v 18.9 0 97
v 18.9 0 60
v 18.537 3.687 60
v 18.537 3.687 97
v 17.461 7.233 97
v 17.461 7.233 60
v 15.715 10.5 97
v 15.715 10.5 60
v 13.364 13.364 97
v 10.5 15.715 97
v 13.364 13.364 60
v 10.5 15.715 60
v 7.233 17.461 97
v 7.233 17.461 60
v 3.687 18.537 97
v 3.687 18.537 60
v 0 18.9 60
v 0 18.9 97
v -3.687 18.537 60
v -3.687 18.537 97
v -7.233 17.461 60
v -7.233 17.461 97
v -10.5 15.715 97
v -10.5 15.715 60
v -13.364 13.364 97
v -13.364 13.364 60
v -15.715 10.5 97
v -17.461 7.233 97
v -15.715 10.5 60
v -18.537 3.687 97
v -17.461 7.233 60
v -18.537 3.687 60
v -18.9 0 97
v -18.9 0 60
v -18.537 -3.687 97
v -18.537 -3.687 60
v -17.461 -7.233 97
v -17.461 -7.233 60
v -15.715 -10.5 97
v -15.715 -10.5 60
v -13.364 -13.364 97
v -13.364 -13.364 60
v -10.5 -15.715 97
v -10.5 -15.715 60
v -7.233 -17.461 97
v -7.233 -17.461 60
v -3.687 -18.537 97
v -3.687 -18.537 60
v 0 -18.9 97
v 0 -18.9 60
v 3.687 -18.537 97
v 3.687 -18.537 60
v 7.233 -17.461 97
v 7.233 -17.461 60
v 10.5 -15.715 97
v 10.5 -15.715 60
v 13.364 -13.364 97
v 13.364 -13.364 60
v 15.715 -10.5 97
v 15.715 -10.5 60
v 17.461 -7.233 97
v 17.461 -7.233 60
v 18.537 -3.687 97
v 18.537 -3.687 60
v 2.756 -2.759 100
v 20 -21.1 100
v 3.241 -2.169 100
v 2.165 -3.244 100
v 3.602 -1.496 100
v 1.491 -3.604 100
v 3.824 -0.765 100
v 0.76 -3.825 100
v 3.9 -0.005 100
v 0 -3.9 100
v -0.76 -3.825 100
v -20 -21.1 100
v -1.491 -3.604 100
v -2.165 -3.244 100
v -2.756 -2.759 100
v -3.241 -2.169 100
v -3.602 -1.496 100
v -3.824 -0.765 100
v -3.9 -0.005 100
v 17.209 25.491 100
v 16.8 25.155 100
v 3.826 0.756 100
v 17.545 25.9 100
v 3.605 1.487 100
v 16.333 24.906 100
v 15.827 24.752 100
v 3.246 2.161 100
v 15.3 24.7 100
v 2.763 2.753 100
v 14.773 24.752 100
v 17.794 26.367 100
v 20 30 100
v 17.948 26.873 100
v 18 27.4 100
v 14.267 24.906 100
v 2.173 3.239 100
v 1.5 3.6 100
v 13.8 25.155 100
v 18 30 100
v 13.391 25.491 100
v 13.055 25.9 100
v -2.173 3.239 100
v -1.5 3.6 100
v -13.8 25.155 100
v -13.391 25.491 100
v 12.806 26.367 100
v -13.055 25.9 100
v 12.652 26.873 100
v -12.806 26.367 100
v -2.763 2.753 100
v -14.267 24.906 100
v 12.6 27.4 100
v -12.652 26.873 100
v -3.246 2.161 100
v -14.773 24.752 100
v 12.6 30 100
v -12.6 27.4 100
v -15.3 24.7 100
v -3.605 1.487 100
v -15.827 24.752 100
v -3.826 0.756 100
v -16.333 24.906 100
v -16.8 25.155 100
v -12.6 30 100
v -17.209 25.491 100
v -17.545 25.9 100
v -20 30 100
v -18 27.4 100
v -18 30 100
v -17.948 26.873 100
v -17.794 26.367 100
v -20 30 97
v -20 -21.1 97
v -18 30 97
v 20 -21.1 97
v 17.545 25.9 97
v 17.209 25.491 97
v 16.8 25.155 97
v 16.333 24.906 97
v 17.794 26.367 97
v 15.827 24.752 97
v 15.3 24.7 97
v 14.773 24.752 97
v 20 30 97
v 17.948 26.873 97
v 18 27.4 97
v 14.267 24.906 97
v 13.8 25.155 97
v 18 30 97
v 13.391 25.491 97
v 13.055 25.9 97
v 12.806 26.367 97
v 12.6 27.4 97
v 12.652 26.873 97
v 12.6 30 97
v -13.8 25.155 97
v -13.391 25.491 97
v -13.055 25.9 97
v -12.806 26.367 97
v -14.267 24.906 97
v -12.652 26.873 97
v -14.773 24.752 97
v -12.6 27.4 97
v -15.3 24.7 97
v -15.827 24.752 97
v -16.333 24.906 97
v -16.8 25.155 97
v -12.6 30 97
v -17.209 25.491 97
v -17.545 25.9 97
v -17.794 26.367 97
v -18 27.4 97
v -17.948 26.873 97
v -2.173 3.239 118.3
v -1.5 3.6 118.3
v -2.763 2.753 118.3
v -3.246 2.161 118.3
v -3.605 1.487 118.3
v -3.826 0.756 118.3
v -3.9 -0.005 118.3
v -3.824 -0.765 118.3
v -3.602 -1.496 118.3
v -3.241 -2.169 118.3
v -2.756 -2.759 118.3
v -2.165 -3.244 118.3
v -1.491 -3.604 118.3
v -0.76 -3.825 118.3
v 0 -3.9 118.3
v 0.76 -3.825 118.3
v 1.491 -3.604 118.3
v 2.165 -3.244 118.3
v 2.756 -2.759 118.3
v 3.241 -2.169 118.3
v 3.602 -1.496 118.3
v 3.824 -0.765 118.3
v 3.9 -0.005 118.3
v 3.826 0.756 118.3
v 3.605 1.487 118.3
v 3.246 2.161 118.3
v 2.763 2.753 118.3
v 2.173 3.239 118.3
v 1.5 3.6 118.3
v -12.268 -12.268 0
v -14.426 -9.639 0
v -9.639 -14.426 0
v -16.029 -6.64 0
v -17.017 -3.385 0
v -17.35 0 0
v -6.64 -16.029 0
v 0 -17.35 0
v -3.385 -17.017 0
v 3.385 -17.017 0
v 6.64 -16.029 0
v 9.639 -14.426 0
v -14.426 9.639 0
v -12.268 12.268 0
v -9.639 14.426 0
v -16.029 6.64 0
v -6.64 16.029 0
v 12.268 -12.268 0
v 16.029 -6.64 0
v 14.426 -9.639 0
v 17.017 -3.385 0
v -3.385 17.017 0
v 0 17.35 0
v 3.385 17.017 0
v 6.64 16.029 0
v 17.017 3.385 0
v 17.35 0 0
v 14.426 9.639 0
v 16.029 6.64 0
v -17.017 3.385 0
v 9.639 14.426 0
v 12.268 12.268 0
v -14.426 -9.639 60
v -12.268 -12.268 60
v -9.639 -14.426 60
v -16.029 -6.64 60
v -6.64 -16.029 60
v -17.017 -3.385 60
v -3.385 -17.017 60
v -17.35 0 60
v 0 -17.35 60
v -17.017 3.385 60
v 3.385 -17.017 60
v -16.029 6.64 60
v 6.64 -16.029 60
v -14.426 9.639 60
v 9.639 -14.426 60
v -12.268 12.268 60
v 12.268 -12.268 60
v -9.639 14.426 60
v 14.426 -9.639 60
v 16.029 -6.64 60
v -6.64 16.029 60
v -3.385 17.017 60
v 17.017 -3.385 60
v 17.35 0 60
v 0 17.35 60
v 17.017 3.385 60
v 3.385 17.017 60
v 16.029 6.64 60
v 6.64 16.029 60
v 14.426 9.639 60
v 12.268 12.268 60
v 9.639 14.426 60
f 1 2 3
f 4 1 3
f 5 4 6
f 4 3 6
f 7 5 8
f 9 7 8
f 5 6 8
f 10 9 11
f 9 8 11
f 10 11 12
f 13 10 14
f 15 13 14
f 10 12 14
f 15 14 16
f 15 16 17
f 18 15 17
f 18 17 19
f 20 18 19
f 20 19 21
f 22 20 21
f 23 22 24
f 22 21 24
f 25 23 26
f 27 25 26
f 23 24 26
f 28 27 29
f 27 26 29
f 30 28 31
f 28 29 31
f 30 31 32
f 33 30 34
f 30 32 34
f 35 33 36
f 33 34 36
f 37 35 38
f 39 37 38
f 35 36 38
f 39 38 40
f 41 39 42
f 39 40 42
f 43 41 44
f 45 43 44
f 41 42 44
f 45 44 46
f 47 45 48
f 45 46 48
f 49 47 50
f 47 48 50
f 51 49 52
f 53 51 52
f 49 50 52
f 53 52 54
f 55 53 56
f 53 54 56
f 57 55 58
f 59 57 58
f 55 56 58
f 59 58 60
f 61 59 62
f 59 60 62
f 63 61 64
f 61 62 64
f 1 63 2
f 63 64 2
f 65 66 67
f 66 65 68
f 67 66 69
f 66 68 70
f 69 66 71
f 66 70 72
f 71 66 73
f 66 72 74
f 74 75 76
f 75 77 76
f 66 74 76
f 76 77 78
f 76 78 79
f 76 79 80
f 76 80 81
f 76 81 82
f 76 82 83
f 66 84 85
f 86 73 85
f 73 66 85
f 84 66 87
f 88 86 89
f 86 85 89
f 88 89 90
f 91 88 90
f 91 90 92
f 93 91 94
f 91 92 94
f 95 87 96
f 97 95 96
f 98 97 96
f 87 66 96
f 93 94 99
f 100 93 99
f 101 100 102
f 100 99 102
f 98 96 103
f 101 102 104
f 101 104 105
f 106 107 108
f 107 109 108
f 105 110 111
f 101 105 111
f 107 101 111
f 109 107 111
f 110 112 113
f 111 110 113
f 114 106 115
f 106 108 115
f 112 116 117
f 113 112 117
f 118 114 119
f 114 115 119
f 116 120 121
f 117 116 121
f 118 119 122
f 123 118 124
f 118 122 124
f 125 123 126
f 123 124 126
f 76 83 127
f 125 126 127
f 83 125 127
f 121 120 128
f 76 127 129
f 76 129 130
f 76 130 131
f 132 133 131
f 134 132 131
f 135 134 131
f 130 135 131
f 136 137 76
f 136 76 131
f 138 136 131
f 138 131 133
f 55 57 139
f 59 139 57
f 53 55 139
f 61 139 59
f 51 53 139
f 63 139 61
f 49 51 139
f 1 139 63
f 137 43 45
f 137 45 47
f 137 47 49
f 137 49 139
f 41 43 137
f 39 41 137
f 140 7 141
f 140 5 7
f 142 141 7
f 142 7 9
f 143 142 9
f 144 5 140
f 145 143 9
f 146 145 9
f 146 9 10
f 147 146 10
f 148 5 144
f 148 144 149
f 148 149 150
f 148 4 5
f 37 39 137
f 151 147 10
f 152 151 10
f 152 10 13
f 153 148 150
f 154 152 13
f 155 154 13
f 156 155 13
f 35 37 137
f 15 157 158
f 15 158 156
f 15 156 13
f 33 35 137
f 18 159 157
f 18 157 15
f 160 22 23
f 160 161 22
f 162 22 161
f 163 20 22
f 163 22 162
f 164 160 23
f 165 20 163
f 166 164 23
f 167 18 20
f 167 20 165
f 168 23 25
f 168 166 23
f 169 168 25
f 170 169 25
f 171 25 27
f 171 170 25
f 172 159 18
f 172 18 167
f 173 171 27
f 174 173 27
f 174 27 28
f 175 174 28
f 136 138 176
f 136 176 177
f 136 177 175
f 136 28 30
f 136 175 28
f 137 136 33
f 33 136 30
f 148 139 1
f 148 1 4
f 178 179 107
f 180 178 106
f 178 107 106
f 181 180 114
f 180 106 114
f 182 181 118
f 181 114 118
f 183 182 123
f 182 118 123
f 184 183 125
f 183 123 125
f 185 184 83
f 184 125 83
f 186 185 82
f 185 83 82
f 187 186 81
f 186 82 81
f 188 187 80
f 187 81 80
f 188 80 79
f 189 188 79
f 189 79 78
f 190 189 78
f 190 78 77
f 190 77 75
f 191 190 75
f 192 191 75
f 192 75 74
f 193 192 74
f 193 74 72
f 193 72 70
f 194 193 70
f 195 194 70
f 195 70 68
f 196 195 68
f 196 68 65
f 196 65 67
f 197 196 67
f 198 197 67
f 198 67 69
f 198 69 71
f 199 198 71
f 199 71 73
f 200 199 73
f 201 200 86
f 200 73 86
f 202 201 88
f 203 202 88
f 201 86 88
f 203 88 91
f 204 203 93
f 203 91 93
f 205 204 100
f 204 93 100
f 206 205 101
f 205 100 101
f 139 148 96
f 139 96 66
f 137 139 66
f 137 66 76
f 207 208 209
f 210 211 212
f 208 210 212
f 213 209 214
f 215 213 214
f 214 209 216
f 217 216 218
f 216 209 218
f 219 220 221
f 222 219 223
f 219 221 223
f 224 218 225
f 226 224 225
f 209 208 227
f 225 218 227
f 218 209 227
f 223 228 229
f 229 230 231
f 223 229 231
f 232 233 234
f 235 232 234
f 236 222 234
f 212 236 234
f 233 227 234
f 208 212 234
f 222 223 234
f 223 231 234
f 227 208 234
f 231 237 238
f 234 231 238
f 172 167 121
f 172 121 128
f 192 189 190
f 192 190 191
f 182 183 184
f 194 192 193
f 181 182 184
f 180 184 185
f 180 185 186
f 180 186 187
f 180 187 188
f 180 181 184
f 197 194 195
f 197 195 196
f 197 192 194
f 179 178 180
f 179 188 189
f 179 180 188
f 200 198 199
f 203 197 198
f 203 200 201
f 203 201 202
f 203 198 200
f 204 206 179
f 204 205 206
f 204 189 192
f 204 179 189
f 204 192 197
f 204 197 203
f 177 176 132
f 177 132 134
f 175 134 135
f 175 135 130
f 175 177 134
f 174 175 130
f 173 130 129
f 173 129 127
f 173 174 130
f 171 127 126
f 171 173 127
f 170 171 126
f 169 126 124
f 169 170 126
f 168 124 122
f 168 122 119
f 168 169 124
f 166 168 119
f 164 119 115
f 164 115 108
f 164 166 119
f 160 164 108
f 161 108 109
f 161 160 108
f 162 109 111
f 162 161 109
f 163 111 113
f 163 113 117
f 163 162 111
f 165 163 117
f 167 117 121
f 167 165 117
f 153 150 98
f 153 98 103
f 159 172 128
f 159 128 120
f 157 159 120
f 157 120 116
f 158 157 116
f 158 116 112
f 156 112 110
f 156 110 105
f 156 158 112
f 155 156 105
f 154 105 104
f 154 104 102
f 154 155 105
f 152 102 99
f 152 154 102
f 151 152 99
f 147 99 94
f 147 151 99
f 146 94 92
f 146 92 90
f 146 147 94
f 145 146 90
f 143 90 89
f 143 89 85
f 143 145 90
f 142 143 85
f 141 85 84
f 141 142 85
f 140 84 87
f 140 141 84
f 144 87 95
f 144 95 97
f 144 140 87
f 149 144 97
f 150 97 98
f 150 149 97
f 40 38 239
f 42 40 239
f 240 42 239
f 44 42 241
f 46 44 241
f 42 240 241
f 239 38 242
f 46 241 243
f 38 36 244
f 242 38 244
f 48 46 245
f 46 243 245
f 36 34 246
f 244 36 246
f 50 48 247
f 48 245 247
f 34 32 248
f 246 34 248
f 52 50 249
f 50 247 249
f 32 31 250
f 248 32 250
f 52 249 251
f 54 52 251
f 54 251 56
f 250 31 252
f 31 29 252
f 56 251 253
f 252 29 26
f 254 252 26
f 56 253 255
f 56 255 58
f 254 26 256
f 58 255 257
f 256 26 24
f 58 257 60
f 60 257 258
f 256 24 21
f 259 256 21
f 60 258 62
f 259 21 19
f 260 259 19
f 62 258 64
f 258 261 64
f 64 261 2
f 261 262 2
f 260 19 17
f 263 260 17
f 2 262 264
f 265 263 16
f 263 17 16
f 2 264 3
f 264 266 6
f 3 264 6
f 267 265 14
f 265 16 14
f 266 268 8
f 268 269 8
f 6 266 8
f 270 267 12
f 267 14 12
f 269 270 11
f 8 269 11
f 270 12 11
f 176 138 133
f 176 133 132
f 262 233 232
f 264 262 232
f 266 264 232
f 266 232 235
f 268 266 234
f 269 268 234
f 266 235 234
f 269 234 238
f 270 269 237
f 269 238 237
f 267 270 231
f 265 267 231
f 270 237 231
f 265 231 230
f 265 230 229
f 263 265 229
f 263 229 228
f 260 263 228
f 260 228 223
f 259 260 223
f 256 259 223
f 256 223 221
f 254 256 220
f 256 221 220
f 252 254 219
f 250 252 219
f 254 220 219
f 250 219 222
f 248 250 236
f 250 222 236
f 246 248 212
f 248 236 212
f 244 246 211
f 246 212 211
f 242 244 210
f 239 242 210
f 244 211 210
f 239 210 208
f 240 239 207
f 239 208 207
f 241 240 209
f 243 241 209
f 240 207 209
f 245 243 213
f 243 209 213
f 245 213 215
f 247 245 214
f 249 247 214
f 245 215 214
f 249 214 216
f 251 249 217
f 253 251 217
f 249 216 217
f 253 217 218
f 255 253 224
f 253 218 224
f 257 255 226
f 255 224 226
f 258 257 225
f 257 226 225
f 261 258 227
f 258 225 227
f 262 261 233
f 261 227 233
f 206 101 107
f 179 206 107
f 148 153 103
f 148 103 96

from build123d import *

# Parameters (mm, degrees)
SKETCH1_R           = 17.35
BOSS_EXTRUDE1_DEPTH = 60
SKETCH2_R           = 18.9
BOSS_EXTRUDE2_DEPTH = 37
BOSS_EXTRUDE4_DEPTH = 3
BOSS_EXTRUDE3_DEPTH = 21.3


with BuildPart() as part:
    # Sketch1 → Boss-Extrude1 (new body)
    with BuildSketch(Plane.XY):
        Circle(SKETCH1_R)
    extrude(amount=BOSS_EXTRUDE1_DEPTH)

    # Sketch2 → Boss-Extrude2 (add)
    with BuildSketch(Plane.XY.offset(60)):
        Circle(SKETCH2_R)
    extrude(amount=BOSS_EXTRUDE2_DEPTH)

    # Sketch4 → Boss-Extrude4 (add)
    with BuildSketch(Plane.XY.offset(97)):
        with BuildLine():
            Line((20, 21.1), (20, -21.1))
            Line((20, -21.1), (-20, -21.1))
            Line((-20, -21.1), (-20, 21.1))
            Line((-20, 21.1), (-20, 30))
            Line((-20, 30), (-18, 30))
            Line((-18, 30), (-18, 27.4))
            ThreePointArc((-18, 27.4), (-15.3, 24.7), (-12.6, 27.4))
            Line((-12.6, 27.4), (-12.6, 30))
            Line((-12.6, 30), (12.6, 30))
            Line((12.6, 30), (12.6, 27.4))
            ThreePointArc((12.6, 27.4), (15.3, 24.7), (18, 27.4))
            Line((18, 27.4), (18, 30))
            Line((18, 30), (20, 30))
            Line((20, 30), (20, 21.1))
        make_face()
    extrude(amount=BOSS_EXTRUDE4_DEPTH)

    # Sketch3 → Boss-Extrude3 (add)
    with BuildSketch(Plane.XY.offset(97)):
        with BuildLine():
            Line((1.5, 3.6), (0, 3.6))
            Line((0, 3.6), (-1.5, 3.6))
            ThreePointArc((-1.5, 3.6), (0, -3.9), (1.5, 3.6))
        make_face()
    extrude(amount=BOSS_EXTRUDE3_DEPTH)


solid = part.part
